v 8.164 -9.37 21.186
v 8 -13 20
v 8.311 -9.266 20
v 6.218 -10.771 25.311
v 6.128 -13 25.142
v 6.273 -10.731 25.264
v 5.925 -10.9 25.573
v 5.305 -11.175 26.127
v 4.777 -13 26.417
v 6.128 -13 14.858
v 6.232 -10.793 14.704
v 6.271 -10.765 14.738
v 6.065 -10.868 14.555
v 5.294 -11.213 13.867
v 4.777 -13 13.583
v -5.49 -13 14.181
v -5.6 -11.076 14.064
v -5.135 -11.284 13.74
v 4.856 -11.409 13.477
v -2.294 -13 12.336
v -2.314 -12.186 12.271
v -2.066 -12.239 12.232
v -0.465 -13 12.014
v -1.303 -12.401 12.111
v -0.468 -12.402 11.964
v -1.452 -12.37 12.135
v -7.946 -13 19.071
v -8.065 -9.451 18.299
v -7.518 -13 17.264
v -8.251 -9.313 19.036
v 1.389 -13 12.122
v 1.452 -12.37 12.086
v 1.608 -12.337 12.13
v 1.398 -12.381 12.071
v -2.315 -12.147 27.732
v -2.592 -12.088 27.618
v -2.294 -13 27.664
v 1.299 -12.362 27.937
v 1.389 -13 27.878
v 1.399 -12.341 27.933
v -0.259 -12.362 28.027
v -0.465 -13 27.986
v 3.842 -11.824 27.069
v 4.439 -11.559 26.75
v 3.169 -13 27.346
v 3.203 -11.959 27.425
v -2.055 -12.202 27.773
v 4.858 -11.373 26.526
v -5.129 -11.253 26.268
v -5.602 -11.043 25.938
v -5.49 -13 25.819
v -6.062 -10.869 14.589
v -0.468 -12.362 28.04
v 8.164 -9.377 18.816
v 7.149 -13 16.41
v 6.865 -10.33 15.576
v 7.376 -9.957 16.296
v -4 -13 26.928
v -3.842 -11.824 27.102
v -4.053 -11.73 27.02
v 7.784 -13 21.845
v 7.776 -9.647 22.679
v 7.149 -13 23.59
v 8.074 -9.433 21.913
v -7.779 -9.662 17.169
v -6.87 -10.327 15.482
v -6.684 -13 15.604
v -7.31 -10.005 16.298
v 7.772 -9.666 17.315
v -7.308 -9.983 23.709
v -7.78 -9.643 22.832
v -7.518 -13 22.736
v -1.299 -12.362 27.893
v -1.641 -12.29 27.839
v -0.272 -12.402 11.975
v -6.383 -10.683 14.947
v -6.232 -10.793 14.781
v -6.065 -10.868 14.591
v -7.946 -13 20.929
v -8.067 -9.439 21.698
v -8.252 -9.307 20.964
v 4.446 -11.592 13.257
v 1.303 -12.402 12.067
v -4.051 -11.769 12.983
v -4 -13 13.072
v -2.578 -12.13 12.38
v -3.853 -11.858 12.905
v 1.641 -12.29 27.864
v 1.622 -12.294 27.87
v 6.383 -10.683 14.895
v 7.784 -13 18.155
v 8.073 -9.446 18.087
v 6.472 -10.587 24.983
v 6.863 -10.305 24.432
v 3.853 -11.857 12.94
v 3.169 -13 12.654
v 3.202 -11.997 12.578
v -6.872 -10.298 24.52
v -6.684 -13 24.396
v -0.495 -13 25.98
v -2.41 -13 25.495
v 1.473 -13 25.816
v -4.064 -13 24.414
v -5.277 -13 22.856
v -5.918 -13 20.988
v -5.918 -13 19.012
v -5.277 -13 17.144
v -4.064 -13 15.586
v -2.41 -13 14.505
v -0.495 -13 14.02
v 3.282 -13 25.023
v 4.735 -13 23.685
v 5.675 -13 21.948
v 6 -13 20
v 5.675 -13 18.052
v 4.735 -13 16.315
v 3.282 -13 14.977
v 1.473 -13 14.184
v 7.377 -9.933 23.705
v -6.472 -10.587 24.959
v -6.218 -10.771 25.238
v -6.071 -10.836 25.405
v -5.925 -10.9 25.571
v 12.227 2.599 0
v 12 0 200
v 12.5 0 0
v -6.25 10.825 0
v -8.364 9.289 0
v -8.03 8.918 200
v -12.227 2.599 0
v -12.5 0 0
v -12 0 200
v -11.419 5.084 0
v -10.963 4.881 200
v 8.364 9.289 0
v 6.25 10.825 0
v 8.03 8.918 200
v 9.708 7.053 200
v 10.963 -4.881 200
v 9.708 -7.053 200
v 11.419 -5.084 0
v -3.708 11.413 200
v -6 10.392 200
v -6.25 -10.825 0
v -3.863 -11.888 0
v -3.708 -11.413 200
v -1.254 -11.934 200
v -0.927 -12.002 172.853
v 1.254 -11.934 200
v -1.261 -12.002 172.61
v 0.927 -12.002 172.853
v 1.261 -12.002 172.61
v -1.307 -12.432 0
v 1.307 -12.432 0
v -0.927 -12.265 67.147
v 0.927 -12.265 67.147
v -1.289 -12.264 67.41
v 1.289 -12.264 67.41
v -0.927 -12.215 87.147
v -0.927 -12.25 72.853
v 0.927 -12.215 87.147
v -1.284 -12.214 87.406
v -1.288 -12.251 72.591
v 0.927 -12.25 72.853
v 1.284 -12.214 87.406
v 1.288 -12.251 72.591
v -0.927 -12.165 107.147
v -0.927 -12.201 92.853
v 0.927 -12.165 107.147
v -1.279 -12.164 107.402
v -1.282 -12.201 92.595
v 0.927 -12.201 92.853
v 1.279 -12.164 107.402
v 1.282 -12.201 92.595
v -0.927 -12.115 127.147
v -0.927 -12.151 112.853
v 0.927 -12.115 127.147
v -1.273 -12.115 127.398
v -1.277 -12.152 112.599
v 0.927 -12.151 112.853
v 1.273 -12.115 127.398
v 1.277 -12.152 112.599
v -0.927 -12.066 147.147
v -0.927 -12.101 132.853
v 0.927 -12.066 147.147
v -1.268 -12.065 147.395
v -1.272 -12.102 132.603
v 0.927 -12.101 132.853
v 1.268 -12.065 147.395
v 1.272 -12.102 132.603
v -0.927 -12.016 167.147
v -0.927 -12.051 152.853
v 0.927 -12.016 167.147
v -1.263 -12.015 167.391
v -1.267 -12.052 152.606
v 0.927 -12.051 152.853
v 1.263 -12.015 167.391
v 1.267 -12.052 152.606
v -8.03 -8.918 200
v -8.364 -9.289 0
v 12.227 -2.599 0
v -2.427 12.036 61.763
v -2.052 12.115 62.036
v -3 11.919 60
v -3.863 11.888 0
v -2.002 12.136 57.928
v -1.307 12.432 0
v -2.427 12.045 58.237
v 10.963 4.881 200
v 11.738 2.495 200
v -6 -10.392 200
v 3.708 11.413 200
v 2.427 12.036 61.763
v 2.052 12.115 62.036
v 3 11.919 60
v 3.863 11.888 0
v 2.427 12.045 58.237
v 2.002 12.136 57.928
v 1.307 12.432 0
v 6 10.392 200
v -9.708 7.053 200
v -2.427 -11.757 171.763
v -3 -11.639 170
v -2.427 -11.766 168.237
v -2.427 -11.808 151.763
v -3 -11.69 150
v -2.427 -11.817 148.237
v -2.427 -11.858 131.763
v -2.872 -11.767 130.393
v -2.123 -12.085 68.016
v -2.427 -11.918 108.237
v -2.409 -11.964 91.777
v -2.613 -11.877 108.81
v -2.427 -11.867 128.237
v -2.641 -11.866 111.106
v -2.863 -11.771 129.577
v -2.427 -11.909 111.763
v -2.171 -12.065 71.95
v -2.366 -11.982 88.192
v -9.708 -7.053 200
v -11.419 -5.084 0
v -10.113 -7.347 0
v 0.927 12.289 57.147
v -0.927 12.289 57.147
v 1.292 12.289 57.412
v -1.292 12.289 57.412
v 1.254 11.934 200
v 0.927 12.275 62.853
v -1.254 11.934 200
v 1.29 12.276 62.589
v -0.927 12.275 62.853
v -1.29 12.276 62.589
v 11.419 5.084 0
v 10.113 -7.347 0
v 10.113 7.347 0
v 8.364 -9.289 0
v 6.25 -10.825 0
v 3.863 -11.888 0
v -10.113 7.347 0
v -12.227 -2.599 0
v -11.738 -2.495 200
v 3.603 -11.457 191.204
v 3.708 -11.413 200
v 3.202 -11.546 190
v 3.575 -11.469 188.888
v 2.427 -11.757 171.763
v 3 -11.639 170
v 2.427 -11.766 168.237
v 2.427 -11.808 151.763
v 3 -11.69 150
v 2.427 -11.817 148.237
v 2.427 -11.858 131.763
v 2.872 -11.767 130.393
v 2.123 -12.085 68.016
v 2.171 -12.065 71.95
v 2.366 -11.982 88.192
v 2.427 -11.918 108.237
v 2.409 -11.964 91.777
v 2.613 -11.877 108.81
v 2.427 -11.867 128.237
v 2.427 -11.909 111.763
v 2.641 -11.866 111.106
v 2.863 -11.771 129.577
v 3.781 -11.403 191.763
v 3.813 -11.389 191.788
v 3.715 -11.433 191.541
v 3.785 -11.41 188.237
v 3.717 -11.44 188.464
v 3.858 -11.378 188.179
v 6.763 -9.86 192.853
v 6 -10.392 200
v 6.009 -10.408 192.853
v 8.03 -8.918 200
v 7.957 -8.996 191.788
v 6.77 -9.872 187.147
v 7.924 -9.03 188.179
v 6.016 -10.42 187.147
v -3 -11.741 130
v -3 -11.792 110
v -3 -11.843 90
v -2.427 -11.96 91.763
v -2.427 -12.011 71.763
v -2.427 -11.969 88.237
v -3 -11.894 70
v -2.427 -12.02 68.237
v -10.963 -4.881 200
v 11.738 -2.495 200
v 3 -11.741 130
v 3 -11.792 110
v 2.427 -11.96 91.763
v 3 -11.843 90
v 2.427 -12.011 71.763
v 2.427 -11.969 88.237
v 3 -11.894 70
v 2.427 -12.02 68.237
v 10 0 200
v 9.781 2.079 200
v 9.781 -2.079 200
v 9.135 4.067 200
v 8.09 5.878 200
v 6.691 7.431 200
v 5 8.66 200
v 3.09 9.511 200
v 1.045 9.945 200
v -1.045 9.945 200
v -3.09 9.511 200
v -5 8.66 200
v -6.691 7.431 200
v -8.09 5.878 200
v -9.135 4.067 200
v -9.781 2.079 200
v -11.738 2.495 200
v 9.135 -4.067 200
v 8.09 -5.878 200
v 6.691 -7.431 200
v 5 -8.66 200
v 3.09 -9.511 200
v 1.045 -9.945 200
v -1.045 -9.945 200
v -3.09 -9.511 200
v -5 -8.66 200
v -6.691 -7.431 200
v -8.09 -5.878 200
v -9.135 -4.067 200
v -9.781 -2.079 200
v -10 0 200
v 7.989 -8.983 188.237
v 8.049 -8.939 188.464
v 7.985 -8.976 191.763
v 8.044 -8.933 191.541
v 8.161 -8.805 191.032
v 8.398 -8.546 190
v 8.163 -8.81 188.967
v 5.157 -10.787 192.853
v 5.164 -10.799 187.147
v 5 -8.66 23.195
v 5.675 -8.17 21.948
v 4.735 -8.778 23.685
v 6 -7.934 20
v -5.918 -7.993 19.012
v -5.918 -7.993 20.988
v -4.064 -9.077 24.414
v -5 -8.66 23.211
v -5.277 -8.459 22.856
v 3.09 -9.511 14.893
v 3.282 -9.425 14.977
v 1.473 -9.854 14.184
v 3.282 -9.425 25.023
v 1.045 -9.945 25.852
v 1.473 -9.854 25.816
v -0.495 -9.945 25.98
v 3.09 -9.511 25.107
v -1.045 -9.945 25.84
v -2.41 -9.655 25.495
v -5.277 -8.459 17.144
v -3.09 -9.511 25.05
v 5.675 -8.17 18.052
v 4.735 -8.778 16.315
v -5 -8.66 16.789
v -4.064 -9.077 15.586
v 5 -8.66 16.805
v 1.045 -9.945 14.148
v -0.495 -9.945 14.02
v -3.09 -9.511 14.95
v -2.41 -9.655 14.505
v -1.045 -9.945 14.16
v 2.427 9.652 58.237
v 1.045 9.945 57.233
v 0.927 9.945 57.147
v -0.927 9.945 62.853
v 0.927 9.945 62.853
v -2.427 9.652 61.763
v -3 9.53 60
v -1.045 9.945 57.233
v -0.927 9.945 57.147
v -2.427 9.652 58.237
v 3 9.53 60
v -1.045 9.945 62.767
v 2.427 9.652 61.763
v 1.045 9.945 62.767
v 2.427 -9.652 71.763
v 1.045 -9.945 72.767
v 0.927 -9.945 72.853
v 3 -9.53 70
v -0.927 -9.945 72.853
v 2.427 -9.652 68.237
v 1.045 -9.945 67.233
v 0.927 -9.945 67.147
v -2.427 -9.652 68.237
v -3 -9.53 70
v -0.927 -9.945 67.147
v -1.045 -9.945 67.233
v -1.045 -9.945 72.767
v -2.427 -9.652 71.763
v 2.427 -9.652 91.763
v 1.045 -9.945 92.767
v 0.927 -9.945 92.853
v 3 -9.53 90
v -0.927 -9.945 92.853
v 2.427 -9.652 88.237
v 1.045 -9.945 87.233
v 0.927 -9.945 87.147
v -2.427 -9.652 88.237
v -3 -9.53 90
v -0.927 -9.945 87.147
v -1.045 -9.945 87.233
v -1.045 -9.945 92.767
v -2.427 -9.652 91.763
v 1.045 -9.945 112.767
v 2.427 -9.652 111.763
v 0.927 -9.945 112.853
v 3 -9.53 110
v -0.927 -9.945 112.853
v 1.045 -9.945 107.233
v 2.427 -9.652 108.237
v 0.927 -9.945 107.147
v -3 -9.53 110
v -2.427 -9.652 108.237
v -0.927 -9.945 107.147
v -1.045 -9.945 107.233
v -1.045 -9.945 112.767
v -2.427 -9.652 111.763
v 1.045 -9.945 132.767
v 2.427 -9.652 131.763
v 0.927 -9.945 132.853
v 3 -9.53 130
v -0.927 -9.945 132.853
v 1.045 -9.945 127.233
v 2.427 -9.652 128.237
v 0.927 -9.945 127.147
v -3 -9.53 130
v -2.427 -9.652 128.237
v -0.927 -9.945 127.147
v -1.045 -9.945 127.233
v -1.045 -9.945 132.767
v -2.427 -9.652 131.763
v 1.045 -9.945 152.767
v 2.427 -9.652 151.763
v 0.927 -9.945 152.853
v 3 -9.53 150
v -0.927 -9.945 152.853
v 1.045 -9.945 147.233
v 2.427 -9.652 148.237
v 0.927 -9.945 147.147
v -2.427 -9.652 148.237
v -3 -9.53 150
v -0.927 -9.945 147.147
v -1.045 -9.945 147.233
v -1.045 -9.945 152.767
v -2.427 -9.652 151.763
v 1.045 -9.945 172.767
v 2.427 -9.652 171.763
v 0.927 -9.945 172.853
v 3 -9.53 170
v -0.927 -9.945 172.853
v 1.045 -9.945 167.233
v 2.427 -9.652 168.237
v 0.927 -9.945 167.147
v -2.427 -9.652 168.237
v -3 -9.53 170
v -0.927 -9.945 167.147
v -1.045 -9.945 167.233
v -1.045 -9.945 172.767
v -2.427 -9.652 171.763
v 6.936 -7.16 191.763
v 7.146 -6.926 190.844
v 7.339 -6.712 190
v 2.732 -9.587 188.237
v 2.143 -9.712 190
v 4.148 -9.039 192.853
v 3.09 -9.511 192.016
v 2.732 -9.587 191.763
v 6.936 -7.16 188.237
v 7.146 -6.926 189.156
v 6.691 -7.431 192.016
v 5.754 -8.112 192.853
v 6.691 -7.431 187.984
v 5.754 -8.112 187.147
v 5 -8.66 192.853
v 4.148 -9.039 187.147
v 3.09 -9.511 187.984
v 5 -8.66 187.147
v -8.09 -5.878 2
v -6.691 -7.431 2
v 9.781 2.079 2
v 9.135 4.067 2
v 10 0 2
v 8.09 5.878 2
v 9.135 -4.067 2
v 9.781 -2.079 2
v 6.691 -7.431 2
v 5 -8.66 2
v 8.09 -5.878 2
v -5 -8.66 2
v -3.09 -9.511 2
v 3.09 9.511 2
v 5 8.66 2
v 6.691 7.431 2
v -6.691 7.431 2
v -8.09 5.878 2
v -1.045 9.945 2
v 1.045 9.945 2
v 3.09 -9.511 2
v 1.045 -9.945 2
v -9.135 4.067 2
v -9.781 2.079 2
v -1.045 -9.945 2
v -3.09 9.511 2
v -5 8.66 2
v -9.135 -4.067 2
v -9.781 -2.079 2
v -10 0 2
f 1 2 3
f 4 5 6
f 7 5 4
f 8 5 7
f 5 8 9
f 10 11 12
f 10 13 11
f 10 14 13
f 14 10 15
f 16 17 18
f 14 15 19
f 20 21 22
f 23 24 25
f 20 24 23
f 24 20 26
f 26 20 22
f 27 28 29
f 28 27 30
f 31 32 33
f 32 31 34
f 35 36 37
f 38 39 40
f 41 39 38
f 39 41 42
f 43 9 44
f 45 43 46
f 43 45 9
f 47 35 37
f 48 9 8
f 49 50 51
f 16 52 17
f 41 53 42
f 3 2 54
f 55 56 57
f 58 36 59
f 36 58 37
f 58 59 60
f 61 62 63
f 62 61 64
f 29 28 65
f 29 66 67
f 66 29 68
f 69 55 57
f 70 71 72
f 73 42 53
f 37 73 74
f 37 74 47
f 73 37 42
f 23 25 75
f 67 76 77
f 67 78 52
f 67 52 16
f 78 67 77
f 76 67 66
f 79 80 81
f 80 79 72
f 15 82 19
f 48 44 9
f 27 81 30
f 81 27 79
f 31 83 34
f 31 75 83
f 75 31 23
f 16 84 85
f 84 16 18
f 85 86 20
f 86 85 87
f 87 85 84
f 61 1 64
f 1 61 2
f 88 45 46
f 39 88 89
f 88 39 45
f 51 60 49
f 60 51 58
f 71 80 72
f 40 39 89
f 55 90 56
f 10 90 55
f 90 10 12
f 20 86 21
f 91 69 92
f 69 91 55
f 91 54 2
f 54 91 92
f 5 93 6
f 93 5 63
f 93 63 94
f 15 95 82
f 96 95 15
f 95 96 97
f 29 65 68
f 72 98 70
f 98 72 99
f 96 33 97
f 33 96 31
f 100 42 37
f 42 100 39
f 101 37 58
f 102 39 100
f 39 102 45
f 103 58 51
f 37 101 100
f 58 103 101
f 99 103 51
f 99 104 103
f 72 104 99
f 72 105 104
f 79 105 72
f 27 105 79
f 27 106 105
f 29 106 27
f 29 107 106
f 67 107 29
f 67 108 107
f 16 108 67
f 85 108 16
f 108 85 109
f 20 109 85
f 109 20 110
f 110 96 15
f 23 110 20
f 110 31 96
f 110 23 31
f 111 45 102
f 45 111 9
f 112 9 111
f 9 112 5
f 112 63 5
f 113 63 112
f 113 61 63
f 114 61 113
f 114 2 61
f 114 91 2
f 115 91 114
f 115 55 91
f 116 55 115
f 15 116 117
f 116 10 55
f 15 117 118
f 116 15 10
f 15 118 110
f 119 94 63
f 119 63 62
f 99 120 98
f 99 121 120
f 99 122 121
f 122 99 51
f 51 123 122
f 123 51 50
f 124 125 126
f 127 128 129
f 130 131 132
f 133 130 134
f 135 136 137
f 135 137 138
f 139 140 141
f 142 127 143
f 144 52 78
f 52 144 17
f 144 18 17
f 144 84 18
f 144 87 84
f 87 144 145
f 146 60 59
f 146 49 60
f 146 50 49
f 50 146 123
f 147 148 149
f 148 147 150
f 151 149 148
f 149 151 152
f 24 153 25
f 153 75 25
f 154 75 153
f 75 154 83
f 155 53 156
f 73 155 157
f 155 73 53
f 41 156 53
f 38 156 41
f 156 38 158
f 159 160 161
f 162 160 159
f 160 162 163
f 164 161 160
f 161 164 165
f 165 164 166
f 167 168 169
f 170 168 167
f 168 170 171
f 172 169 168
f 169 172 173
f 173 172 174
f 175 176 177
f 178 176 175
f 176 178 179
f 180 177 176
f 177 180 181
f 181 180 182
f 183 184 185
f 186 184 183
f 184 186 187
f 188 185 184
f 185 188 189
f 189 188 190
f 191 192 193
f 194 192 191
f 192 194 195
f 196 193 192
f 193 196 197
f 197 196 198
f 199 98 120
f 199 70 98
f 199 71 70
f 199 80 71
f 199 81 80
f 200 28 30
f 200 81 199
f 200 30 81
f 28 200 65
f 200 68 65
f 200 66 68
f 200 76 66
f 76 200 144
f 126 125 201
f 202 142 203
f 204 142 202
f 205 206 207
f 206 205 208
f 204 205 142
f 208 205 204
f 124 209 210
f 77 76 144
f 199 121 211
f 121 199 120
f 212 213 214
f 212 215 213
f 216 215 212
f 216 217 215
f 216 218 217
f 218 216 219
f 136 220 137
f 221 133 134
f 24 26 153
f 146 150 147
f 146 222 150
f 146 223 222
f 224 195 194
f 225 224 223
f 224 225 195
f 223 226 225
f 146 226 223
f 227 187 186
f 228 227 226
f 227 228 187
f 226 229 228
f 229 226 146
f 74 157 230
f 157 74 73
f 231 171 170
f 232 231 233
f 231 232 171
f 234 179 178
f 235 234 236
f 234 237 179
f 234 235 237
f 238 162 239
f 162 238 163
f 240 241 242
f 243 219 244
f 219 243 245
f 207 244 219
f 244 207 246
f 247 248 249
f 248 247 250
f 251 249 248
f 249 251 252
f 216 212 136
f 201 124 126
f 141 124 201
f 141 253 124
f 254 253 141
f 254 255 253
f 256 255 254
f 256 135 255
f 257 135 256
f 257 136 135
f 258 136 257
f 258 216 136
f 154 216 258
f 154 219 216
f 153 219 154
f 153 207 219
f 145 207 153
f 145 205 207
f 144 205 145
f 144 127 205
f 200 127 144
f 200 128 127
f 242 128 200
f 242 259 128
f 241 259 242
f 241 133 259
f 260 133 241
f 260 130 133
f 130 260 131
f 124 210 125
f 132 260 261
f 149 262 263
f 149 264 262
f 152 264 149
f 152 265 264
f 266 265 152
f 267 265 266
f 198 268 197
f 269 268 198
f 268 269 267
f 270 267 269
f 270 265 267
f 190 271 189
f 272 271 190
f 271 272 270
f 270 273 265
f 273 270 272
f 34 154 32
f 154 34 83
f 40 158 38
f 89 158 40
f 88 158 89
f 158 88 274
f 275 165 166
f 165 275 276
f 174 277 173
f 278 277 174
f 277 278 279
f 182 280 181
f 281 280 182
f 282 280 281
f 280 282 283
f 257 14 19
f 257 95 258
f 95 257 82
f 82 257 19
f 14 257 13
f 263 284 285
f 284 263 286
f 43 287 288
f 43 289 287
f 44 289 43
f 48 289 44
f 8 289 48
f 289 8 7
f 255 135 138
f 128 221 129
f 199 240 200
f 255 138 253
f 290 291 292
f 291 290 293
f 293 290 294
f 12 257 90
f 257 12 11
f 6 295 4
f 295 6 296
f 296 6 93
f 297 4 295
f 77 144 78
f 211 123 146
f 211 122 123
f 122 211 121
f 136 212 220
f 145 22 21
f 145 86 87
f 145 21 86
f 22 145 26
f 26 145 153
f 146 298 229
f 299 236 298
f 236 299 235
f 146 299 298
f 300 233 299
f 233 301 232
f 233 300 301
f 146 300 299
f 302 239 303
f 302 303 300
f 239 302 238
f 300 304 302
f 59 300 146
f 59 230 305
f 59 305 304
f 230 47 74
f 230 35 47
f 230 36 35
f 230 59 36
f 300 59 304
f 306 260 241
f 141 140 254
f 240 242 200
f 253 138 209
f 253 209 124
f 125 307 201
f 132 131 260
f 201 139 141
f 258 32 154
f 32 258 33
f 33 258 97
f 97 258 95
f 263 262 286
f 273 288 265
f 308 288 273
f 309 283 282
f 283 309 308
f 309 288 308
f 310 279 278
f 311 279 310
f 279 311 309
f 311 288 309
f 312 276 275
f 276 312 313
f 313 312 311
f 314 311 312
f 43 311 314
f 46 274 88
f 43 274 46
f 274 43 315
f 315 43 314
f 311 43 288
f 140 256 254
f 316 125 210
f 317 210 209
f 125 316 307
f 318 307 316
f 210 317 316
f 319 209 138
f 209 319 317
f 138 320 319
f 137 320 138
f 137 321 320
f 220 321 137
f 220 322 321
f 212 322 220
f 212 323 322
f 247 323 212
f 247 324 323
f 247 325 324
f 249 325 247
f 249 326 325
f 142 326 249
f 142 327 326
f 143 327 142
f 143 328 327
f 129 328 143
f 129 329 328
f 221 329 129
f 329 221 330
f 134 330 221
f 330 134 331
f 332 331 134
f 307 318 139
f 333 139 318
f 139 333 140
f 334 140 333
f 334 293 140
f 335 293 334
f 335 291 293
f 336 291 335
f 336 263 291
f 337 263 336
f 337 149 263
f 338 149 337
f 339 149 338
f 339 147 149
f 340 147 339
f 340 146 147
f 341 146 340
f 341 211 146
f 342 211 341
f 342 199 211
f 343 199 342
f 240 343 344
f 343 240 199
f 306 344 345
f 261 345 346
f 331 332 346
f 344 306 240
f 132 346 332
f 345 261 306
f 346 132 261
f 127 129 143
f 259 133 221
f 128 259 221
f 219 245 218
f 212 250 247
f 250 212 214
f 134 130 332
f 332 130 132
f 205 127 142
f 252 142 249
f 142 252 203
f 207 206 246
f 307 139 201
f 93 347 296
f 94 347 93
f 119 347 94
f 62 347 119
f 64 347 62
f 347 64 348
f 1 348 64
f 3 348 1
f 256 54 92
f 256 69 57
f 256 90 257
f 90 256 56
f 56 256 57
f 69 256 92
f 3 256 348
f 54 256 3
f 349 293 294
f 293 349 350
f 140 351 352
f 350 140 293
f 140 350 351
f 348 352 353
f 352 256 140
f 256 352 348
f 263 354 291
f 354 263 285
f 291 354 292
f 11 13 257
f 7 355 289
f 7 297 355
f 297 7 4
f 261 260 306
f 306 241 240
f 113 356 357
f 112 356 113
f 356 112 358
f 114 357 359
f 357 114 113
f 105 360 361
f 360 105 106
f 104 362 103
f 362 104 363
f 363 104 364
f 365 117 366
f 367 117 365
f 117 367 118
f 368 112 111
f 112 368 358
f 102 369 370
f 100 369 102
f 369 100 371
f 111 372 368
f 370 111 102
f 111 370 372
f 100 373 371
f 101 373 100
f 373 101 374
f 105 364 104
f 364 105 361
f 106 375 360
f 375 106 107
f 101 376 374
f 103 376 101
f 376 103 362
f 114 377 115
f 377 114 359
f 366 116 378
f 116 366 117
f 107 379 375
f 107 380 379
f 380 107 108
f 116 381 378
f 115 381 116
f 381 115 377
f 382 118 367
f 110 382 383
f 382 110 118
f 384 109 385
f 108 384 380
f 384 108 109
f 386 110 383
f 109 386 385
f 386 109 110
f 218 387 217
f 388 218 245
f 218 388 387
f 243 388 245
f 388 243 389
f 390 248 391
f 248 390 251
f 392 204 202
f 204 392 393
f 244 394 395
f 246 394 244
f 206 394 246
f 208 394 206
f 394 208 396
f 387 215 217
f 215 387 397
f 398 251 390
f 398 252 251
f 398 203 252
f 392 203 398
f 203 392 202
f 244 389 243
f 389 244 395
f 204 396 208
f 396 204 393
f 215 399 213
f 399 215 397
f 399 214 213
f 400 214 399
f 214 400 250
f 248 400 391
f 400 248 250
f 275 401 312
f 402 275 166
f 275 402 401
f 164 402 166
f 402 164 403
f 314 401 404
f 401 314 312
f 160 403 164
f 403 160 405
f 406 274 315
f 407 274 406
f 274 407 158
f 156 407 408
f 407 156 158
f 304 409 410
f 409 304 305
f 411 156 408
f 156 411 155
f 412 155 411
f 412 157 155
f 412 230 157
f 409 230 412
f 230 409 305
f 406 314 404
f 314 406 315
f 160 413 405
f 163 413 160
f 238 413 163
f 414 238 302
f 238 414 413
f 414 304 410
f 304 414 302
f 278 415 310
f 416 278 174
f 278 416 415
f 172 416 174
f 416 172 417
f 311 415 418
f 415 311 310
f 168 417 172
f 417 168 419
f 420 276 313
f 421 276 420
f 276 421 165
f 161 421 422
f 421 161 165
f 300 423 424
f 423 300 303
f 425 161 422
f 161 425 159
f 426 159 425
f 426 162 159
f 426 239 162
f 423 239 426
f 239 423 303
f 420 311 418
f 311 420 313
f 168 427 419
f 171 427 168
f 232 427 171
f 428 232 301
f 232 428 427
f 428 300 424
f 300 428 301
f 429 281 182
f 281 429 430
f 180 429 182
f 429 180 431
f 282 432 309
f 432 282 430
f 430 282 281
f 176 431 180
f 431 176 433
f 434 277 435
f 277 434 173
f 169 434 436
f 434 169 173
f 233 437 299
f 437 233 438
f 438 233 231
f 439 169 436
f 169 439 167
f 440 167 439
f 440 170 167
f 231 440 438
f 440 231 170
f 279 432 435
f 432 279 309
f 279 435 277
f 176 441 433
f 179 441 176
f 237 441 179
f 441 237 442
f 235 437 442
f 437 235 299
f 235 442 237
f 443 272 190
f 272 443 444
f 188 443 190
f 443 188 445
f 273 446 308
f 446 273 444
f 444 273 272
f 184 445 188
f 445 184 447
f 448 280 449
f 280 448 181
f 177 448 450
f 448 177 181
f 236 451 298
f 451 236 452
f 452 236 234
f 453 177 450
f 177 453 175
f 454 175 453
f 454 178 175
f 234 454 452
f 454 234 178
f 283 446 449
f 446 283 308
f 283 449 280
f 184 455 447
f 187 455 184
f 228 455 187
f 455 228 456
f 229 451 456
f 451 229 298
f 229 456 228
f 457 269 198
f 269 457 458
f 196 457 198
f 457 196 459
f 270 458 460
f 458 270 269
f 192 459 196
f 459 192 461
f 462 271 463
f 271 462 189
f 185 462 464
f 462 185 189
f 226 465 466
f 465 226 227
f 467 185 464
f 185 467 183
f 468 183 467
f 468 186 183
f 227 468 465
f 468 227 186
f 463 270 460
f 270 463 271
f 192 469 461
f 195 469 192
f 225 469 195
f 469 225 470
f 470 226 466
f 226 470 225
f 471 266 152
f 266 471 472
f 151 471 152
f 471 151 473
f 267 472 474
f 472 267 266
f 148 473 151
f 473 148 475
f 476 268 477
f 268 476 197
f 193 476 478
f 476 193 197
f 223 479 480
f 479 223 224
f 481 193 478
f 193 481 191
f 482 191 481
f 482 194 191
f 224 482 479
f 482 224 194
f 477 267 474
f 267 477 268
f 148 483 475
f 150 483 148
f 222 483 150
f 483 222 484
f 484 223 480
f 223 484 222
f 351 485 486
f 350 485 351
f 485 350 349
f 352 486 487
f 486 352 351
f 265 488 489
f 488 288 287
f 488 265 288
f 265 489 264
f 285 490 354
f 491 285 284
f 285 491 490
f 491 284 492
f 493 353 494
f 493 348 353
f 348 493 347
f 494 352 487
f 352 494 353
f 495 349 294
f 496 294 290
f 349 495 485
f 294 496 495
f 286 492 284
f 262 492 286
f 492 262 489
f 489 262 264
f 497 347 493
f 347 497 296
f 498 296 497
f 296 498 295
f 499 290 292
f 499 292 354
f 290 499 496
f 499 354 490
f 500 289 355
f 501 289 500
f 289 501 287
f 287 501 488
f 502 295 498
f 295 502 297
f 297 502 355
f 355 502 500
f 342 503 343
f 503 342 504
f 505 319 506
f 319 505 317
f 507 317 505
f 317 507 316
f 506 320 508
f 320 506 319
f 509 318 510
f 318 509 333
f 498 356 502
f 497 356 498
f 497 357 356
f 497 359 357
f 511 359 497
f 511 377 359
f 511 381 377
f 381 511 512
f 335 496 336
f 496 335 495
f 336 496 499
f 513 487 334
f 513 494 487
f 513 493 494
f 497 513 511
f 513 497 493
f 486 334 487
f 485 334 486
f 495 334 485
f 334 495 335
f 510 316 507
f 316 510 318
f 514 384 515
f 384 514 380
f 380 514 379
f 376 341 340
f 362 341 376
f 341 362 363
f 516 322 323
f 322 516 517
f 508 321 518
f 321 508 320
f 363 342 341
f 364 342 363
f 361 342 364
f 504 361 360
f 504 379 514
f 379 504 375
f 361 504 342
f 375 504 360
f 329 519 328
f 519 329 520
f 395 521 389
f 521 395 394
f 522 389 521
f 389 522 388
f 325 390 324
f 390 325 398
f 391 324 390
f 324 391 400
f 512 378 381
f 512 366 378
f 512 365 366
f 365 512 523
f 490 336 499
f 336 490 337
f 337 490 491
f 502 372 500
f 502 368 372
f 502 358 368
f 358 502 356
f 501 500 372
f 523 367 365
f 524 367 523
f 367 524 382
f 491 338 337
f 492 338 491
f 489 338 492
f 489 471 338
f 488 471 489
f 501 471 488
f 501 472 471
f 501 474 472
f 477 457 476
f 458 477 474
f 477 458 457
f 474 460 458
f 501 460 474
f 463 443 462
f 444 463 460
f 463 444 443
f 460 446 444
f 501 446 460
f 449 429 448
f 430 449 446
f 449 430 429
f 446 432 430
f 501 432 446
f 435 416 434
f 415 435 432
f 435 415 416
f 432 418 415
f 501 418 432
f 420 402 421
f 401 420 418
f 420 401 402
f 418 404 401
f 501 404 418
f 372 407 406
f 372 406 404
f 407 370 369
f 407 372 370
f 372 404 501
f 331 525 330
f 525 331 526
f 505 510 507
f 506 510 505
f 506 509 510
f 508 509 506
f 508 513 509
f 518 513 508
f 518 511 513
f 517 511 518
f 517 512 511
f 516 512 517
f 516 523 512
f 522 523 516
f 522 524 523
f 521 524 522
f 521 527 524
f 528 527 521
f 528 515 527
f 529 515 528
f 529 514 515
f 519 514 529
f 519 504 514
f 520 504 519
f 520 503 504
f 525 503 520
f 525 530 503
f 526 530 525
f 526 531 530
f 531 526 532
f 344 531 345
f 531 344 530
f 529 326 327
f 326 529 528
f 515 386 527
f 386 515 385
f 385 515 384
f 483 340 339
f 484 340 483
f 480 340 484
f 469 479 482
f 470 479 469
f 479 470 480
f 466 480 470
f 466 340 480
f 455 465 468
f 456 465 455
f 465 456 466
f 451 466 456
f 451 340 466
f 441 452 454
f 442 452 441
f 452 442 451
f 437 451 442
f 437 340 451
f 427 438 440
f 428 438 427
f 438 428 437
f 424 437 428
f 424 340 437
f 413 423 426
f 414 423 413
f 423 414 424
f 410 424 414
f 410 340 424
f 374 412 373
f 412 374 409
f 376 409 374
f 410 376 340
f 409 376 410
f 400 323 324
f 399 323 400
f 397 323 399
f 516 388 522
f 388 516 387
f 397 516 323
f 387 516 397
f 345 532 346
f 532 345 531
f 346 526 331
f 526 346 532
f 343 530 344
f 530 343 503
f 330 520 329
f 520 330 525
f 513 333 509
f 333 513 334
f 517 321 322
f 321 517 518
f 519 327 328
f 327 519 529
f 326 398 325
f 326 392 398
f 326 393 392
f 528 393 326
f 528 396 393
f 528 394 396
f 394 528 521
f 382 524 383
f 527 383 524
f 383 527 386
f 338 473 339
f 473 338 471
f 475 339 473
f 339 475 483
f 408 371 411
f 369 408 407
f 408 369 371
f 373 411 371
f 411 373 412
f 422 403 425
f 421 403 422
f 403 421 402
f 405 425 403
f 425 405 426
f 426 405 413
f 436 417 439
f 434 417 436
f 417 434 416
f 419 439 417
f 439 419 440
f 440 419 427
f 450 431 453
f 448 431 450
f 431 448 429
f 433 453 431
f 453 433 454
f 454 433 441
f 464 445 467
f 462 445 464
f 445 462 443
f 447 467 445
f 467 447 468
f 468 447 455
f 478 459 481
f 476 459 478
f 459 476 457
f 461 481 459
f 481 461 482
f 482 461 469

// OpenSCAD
//!OpenSCAD
//the above line lets us generate this in jscad (even though we are using a scad syntax!!)

//lines that begin with '//' in javascript mostly (see first line of this file) don't count as far as the computer is concerned, so it's easy to give instructions humans can read like this.

//the next line sets the word  'holes' as the list of numbers outlined below. These lists get sperated by commas, and the semicolon at the end tells the computer that's the end of that statement. These numbers represent the distance from the head of the fife (the part where you blow air) to the center of each hole ( one for mouth, 7 for fingers)
holes = [20,60,70,90,110,130,150,170,190];

//the next line is another list, but this time of how many degrees around the fife the opening gets rotated
holeRotation = [0,180,0,0,0,0,0,0,30];

//another list about how big the opening
holeRadius = [6,3,3,3,3,3,3,3,3];

//tall the darn thing is
height = 200;

//how wide the diameter of the inside resonating chamber is
bore = 20;

//how thick the walls of the fife are
wall = 4;

//everything after the next line is hidden: it is not a number to change
/* [Hidden] */

//true stands the fife on its head, the way up it prints; false lays it on its side, the way it rests (see the end of this file)
print = true;

//a module in openscad is basically a function. Let's you do a whole bunch of code all at once
module fifel(){

	//difference takes the first shape and subtracts all the next shapes from it
	difference() {

	//union combines all the shapes in it to make one larger shape
		union() {

			//this is the outermost shell of the fife. We add the bore and wall variables. R1 is the radius of the head, and r2 is the foot. R1 is a little bigger partly because we want it to taper for comfort, but also to make it print easier. The height is just the height!
			cylinder(r1=(bore+wall+1)/2, r2=(bore+wall)/2, h = height);

			//this next part puts the lip rest on the first opening. Translate moves us out to the edge of the wall (instead of the center like we were) then we rotate to be in line with the opening
			translate([0,-bore/2 +3,holes[0]]) rotate([90,0,0]) {

				//difference because we want the lip rest to have a hole in it so the air goes in!
				difference() {

					//this is the outer cylinder of the lip rest. This is the size of the opening and an additional amount so that it slopes from the bottom to the top
					cylinder(r1=holeRadius[0]+2.5, r2 =holeRadius[0]+2, h = 6);

					//this is then the opening, which slopes the opposite way from the lip rest. this let's the chamber resonate better
					translate([0,0,-1])cylinder(r1 = holeRadius[0], r2=holeRadius[0]-2, h = 7);

				//now we close the difference 3 lines up and we return to the translate
				}

			//now we close the translate 5 lines up and return to the union
			}

		//now we close the union and return to the difference
		}

		//this is the main part of the fife that isnt there. the main resonating chamber
		translate([0,0,2]) cylinder(r=bore/2, h = height);

		//now we are going to go through and make openings (9 in total). The for part tells the word "i" to go from 0 to 9 each time through the next part of the code
		for ( i = [0:len(holes)-1] ){

			//we now adjust the height of the hole with the translate, then the rotation with rotate, and then the cylinder which is at a defined radius, and high enough so it goes all the way out of the wall.
			translate([0,0,holes[i]]) rotate([90,0,holeRotation[i]]) cylinder(r=holeRadius[i], h=bore);
		//now we close the for and return to the union
		}

	//now we close the difference and return to the fifel
	}

//now we close the fifel module
}

//now we call the fifel module to generate the code. To print it, it stands on its head. To rest, rotate lays it on its side, the lip rest down, and translate lifts it by the farthest it reaches below its middle -- the lip rest's tip, or the head's rim -- so it lies on the floor
if (print) fifel();
else translate([0, 0, max(bore/2 + 3, (bore + wall + 1)/2)]) rotate([90, 0, 0]) fifel();

//end of fifel!
